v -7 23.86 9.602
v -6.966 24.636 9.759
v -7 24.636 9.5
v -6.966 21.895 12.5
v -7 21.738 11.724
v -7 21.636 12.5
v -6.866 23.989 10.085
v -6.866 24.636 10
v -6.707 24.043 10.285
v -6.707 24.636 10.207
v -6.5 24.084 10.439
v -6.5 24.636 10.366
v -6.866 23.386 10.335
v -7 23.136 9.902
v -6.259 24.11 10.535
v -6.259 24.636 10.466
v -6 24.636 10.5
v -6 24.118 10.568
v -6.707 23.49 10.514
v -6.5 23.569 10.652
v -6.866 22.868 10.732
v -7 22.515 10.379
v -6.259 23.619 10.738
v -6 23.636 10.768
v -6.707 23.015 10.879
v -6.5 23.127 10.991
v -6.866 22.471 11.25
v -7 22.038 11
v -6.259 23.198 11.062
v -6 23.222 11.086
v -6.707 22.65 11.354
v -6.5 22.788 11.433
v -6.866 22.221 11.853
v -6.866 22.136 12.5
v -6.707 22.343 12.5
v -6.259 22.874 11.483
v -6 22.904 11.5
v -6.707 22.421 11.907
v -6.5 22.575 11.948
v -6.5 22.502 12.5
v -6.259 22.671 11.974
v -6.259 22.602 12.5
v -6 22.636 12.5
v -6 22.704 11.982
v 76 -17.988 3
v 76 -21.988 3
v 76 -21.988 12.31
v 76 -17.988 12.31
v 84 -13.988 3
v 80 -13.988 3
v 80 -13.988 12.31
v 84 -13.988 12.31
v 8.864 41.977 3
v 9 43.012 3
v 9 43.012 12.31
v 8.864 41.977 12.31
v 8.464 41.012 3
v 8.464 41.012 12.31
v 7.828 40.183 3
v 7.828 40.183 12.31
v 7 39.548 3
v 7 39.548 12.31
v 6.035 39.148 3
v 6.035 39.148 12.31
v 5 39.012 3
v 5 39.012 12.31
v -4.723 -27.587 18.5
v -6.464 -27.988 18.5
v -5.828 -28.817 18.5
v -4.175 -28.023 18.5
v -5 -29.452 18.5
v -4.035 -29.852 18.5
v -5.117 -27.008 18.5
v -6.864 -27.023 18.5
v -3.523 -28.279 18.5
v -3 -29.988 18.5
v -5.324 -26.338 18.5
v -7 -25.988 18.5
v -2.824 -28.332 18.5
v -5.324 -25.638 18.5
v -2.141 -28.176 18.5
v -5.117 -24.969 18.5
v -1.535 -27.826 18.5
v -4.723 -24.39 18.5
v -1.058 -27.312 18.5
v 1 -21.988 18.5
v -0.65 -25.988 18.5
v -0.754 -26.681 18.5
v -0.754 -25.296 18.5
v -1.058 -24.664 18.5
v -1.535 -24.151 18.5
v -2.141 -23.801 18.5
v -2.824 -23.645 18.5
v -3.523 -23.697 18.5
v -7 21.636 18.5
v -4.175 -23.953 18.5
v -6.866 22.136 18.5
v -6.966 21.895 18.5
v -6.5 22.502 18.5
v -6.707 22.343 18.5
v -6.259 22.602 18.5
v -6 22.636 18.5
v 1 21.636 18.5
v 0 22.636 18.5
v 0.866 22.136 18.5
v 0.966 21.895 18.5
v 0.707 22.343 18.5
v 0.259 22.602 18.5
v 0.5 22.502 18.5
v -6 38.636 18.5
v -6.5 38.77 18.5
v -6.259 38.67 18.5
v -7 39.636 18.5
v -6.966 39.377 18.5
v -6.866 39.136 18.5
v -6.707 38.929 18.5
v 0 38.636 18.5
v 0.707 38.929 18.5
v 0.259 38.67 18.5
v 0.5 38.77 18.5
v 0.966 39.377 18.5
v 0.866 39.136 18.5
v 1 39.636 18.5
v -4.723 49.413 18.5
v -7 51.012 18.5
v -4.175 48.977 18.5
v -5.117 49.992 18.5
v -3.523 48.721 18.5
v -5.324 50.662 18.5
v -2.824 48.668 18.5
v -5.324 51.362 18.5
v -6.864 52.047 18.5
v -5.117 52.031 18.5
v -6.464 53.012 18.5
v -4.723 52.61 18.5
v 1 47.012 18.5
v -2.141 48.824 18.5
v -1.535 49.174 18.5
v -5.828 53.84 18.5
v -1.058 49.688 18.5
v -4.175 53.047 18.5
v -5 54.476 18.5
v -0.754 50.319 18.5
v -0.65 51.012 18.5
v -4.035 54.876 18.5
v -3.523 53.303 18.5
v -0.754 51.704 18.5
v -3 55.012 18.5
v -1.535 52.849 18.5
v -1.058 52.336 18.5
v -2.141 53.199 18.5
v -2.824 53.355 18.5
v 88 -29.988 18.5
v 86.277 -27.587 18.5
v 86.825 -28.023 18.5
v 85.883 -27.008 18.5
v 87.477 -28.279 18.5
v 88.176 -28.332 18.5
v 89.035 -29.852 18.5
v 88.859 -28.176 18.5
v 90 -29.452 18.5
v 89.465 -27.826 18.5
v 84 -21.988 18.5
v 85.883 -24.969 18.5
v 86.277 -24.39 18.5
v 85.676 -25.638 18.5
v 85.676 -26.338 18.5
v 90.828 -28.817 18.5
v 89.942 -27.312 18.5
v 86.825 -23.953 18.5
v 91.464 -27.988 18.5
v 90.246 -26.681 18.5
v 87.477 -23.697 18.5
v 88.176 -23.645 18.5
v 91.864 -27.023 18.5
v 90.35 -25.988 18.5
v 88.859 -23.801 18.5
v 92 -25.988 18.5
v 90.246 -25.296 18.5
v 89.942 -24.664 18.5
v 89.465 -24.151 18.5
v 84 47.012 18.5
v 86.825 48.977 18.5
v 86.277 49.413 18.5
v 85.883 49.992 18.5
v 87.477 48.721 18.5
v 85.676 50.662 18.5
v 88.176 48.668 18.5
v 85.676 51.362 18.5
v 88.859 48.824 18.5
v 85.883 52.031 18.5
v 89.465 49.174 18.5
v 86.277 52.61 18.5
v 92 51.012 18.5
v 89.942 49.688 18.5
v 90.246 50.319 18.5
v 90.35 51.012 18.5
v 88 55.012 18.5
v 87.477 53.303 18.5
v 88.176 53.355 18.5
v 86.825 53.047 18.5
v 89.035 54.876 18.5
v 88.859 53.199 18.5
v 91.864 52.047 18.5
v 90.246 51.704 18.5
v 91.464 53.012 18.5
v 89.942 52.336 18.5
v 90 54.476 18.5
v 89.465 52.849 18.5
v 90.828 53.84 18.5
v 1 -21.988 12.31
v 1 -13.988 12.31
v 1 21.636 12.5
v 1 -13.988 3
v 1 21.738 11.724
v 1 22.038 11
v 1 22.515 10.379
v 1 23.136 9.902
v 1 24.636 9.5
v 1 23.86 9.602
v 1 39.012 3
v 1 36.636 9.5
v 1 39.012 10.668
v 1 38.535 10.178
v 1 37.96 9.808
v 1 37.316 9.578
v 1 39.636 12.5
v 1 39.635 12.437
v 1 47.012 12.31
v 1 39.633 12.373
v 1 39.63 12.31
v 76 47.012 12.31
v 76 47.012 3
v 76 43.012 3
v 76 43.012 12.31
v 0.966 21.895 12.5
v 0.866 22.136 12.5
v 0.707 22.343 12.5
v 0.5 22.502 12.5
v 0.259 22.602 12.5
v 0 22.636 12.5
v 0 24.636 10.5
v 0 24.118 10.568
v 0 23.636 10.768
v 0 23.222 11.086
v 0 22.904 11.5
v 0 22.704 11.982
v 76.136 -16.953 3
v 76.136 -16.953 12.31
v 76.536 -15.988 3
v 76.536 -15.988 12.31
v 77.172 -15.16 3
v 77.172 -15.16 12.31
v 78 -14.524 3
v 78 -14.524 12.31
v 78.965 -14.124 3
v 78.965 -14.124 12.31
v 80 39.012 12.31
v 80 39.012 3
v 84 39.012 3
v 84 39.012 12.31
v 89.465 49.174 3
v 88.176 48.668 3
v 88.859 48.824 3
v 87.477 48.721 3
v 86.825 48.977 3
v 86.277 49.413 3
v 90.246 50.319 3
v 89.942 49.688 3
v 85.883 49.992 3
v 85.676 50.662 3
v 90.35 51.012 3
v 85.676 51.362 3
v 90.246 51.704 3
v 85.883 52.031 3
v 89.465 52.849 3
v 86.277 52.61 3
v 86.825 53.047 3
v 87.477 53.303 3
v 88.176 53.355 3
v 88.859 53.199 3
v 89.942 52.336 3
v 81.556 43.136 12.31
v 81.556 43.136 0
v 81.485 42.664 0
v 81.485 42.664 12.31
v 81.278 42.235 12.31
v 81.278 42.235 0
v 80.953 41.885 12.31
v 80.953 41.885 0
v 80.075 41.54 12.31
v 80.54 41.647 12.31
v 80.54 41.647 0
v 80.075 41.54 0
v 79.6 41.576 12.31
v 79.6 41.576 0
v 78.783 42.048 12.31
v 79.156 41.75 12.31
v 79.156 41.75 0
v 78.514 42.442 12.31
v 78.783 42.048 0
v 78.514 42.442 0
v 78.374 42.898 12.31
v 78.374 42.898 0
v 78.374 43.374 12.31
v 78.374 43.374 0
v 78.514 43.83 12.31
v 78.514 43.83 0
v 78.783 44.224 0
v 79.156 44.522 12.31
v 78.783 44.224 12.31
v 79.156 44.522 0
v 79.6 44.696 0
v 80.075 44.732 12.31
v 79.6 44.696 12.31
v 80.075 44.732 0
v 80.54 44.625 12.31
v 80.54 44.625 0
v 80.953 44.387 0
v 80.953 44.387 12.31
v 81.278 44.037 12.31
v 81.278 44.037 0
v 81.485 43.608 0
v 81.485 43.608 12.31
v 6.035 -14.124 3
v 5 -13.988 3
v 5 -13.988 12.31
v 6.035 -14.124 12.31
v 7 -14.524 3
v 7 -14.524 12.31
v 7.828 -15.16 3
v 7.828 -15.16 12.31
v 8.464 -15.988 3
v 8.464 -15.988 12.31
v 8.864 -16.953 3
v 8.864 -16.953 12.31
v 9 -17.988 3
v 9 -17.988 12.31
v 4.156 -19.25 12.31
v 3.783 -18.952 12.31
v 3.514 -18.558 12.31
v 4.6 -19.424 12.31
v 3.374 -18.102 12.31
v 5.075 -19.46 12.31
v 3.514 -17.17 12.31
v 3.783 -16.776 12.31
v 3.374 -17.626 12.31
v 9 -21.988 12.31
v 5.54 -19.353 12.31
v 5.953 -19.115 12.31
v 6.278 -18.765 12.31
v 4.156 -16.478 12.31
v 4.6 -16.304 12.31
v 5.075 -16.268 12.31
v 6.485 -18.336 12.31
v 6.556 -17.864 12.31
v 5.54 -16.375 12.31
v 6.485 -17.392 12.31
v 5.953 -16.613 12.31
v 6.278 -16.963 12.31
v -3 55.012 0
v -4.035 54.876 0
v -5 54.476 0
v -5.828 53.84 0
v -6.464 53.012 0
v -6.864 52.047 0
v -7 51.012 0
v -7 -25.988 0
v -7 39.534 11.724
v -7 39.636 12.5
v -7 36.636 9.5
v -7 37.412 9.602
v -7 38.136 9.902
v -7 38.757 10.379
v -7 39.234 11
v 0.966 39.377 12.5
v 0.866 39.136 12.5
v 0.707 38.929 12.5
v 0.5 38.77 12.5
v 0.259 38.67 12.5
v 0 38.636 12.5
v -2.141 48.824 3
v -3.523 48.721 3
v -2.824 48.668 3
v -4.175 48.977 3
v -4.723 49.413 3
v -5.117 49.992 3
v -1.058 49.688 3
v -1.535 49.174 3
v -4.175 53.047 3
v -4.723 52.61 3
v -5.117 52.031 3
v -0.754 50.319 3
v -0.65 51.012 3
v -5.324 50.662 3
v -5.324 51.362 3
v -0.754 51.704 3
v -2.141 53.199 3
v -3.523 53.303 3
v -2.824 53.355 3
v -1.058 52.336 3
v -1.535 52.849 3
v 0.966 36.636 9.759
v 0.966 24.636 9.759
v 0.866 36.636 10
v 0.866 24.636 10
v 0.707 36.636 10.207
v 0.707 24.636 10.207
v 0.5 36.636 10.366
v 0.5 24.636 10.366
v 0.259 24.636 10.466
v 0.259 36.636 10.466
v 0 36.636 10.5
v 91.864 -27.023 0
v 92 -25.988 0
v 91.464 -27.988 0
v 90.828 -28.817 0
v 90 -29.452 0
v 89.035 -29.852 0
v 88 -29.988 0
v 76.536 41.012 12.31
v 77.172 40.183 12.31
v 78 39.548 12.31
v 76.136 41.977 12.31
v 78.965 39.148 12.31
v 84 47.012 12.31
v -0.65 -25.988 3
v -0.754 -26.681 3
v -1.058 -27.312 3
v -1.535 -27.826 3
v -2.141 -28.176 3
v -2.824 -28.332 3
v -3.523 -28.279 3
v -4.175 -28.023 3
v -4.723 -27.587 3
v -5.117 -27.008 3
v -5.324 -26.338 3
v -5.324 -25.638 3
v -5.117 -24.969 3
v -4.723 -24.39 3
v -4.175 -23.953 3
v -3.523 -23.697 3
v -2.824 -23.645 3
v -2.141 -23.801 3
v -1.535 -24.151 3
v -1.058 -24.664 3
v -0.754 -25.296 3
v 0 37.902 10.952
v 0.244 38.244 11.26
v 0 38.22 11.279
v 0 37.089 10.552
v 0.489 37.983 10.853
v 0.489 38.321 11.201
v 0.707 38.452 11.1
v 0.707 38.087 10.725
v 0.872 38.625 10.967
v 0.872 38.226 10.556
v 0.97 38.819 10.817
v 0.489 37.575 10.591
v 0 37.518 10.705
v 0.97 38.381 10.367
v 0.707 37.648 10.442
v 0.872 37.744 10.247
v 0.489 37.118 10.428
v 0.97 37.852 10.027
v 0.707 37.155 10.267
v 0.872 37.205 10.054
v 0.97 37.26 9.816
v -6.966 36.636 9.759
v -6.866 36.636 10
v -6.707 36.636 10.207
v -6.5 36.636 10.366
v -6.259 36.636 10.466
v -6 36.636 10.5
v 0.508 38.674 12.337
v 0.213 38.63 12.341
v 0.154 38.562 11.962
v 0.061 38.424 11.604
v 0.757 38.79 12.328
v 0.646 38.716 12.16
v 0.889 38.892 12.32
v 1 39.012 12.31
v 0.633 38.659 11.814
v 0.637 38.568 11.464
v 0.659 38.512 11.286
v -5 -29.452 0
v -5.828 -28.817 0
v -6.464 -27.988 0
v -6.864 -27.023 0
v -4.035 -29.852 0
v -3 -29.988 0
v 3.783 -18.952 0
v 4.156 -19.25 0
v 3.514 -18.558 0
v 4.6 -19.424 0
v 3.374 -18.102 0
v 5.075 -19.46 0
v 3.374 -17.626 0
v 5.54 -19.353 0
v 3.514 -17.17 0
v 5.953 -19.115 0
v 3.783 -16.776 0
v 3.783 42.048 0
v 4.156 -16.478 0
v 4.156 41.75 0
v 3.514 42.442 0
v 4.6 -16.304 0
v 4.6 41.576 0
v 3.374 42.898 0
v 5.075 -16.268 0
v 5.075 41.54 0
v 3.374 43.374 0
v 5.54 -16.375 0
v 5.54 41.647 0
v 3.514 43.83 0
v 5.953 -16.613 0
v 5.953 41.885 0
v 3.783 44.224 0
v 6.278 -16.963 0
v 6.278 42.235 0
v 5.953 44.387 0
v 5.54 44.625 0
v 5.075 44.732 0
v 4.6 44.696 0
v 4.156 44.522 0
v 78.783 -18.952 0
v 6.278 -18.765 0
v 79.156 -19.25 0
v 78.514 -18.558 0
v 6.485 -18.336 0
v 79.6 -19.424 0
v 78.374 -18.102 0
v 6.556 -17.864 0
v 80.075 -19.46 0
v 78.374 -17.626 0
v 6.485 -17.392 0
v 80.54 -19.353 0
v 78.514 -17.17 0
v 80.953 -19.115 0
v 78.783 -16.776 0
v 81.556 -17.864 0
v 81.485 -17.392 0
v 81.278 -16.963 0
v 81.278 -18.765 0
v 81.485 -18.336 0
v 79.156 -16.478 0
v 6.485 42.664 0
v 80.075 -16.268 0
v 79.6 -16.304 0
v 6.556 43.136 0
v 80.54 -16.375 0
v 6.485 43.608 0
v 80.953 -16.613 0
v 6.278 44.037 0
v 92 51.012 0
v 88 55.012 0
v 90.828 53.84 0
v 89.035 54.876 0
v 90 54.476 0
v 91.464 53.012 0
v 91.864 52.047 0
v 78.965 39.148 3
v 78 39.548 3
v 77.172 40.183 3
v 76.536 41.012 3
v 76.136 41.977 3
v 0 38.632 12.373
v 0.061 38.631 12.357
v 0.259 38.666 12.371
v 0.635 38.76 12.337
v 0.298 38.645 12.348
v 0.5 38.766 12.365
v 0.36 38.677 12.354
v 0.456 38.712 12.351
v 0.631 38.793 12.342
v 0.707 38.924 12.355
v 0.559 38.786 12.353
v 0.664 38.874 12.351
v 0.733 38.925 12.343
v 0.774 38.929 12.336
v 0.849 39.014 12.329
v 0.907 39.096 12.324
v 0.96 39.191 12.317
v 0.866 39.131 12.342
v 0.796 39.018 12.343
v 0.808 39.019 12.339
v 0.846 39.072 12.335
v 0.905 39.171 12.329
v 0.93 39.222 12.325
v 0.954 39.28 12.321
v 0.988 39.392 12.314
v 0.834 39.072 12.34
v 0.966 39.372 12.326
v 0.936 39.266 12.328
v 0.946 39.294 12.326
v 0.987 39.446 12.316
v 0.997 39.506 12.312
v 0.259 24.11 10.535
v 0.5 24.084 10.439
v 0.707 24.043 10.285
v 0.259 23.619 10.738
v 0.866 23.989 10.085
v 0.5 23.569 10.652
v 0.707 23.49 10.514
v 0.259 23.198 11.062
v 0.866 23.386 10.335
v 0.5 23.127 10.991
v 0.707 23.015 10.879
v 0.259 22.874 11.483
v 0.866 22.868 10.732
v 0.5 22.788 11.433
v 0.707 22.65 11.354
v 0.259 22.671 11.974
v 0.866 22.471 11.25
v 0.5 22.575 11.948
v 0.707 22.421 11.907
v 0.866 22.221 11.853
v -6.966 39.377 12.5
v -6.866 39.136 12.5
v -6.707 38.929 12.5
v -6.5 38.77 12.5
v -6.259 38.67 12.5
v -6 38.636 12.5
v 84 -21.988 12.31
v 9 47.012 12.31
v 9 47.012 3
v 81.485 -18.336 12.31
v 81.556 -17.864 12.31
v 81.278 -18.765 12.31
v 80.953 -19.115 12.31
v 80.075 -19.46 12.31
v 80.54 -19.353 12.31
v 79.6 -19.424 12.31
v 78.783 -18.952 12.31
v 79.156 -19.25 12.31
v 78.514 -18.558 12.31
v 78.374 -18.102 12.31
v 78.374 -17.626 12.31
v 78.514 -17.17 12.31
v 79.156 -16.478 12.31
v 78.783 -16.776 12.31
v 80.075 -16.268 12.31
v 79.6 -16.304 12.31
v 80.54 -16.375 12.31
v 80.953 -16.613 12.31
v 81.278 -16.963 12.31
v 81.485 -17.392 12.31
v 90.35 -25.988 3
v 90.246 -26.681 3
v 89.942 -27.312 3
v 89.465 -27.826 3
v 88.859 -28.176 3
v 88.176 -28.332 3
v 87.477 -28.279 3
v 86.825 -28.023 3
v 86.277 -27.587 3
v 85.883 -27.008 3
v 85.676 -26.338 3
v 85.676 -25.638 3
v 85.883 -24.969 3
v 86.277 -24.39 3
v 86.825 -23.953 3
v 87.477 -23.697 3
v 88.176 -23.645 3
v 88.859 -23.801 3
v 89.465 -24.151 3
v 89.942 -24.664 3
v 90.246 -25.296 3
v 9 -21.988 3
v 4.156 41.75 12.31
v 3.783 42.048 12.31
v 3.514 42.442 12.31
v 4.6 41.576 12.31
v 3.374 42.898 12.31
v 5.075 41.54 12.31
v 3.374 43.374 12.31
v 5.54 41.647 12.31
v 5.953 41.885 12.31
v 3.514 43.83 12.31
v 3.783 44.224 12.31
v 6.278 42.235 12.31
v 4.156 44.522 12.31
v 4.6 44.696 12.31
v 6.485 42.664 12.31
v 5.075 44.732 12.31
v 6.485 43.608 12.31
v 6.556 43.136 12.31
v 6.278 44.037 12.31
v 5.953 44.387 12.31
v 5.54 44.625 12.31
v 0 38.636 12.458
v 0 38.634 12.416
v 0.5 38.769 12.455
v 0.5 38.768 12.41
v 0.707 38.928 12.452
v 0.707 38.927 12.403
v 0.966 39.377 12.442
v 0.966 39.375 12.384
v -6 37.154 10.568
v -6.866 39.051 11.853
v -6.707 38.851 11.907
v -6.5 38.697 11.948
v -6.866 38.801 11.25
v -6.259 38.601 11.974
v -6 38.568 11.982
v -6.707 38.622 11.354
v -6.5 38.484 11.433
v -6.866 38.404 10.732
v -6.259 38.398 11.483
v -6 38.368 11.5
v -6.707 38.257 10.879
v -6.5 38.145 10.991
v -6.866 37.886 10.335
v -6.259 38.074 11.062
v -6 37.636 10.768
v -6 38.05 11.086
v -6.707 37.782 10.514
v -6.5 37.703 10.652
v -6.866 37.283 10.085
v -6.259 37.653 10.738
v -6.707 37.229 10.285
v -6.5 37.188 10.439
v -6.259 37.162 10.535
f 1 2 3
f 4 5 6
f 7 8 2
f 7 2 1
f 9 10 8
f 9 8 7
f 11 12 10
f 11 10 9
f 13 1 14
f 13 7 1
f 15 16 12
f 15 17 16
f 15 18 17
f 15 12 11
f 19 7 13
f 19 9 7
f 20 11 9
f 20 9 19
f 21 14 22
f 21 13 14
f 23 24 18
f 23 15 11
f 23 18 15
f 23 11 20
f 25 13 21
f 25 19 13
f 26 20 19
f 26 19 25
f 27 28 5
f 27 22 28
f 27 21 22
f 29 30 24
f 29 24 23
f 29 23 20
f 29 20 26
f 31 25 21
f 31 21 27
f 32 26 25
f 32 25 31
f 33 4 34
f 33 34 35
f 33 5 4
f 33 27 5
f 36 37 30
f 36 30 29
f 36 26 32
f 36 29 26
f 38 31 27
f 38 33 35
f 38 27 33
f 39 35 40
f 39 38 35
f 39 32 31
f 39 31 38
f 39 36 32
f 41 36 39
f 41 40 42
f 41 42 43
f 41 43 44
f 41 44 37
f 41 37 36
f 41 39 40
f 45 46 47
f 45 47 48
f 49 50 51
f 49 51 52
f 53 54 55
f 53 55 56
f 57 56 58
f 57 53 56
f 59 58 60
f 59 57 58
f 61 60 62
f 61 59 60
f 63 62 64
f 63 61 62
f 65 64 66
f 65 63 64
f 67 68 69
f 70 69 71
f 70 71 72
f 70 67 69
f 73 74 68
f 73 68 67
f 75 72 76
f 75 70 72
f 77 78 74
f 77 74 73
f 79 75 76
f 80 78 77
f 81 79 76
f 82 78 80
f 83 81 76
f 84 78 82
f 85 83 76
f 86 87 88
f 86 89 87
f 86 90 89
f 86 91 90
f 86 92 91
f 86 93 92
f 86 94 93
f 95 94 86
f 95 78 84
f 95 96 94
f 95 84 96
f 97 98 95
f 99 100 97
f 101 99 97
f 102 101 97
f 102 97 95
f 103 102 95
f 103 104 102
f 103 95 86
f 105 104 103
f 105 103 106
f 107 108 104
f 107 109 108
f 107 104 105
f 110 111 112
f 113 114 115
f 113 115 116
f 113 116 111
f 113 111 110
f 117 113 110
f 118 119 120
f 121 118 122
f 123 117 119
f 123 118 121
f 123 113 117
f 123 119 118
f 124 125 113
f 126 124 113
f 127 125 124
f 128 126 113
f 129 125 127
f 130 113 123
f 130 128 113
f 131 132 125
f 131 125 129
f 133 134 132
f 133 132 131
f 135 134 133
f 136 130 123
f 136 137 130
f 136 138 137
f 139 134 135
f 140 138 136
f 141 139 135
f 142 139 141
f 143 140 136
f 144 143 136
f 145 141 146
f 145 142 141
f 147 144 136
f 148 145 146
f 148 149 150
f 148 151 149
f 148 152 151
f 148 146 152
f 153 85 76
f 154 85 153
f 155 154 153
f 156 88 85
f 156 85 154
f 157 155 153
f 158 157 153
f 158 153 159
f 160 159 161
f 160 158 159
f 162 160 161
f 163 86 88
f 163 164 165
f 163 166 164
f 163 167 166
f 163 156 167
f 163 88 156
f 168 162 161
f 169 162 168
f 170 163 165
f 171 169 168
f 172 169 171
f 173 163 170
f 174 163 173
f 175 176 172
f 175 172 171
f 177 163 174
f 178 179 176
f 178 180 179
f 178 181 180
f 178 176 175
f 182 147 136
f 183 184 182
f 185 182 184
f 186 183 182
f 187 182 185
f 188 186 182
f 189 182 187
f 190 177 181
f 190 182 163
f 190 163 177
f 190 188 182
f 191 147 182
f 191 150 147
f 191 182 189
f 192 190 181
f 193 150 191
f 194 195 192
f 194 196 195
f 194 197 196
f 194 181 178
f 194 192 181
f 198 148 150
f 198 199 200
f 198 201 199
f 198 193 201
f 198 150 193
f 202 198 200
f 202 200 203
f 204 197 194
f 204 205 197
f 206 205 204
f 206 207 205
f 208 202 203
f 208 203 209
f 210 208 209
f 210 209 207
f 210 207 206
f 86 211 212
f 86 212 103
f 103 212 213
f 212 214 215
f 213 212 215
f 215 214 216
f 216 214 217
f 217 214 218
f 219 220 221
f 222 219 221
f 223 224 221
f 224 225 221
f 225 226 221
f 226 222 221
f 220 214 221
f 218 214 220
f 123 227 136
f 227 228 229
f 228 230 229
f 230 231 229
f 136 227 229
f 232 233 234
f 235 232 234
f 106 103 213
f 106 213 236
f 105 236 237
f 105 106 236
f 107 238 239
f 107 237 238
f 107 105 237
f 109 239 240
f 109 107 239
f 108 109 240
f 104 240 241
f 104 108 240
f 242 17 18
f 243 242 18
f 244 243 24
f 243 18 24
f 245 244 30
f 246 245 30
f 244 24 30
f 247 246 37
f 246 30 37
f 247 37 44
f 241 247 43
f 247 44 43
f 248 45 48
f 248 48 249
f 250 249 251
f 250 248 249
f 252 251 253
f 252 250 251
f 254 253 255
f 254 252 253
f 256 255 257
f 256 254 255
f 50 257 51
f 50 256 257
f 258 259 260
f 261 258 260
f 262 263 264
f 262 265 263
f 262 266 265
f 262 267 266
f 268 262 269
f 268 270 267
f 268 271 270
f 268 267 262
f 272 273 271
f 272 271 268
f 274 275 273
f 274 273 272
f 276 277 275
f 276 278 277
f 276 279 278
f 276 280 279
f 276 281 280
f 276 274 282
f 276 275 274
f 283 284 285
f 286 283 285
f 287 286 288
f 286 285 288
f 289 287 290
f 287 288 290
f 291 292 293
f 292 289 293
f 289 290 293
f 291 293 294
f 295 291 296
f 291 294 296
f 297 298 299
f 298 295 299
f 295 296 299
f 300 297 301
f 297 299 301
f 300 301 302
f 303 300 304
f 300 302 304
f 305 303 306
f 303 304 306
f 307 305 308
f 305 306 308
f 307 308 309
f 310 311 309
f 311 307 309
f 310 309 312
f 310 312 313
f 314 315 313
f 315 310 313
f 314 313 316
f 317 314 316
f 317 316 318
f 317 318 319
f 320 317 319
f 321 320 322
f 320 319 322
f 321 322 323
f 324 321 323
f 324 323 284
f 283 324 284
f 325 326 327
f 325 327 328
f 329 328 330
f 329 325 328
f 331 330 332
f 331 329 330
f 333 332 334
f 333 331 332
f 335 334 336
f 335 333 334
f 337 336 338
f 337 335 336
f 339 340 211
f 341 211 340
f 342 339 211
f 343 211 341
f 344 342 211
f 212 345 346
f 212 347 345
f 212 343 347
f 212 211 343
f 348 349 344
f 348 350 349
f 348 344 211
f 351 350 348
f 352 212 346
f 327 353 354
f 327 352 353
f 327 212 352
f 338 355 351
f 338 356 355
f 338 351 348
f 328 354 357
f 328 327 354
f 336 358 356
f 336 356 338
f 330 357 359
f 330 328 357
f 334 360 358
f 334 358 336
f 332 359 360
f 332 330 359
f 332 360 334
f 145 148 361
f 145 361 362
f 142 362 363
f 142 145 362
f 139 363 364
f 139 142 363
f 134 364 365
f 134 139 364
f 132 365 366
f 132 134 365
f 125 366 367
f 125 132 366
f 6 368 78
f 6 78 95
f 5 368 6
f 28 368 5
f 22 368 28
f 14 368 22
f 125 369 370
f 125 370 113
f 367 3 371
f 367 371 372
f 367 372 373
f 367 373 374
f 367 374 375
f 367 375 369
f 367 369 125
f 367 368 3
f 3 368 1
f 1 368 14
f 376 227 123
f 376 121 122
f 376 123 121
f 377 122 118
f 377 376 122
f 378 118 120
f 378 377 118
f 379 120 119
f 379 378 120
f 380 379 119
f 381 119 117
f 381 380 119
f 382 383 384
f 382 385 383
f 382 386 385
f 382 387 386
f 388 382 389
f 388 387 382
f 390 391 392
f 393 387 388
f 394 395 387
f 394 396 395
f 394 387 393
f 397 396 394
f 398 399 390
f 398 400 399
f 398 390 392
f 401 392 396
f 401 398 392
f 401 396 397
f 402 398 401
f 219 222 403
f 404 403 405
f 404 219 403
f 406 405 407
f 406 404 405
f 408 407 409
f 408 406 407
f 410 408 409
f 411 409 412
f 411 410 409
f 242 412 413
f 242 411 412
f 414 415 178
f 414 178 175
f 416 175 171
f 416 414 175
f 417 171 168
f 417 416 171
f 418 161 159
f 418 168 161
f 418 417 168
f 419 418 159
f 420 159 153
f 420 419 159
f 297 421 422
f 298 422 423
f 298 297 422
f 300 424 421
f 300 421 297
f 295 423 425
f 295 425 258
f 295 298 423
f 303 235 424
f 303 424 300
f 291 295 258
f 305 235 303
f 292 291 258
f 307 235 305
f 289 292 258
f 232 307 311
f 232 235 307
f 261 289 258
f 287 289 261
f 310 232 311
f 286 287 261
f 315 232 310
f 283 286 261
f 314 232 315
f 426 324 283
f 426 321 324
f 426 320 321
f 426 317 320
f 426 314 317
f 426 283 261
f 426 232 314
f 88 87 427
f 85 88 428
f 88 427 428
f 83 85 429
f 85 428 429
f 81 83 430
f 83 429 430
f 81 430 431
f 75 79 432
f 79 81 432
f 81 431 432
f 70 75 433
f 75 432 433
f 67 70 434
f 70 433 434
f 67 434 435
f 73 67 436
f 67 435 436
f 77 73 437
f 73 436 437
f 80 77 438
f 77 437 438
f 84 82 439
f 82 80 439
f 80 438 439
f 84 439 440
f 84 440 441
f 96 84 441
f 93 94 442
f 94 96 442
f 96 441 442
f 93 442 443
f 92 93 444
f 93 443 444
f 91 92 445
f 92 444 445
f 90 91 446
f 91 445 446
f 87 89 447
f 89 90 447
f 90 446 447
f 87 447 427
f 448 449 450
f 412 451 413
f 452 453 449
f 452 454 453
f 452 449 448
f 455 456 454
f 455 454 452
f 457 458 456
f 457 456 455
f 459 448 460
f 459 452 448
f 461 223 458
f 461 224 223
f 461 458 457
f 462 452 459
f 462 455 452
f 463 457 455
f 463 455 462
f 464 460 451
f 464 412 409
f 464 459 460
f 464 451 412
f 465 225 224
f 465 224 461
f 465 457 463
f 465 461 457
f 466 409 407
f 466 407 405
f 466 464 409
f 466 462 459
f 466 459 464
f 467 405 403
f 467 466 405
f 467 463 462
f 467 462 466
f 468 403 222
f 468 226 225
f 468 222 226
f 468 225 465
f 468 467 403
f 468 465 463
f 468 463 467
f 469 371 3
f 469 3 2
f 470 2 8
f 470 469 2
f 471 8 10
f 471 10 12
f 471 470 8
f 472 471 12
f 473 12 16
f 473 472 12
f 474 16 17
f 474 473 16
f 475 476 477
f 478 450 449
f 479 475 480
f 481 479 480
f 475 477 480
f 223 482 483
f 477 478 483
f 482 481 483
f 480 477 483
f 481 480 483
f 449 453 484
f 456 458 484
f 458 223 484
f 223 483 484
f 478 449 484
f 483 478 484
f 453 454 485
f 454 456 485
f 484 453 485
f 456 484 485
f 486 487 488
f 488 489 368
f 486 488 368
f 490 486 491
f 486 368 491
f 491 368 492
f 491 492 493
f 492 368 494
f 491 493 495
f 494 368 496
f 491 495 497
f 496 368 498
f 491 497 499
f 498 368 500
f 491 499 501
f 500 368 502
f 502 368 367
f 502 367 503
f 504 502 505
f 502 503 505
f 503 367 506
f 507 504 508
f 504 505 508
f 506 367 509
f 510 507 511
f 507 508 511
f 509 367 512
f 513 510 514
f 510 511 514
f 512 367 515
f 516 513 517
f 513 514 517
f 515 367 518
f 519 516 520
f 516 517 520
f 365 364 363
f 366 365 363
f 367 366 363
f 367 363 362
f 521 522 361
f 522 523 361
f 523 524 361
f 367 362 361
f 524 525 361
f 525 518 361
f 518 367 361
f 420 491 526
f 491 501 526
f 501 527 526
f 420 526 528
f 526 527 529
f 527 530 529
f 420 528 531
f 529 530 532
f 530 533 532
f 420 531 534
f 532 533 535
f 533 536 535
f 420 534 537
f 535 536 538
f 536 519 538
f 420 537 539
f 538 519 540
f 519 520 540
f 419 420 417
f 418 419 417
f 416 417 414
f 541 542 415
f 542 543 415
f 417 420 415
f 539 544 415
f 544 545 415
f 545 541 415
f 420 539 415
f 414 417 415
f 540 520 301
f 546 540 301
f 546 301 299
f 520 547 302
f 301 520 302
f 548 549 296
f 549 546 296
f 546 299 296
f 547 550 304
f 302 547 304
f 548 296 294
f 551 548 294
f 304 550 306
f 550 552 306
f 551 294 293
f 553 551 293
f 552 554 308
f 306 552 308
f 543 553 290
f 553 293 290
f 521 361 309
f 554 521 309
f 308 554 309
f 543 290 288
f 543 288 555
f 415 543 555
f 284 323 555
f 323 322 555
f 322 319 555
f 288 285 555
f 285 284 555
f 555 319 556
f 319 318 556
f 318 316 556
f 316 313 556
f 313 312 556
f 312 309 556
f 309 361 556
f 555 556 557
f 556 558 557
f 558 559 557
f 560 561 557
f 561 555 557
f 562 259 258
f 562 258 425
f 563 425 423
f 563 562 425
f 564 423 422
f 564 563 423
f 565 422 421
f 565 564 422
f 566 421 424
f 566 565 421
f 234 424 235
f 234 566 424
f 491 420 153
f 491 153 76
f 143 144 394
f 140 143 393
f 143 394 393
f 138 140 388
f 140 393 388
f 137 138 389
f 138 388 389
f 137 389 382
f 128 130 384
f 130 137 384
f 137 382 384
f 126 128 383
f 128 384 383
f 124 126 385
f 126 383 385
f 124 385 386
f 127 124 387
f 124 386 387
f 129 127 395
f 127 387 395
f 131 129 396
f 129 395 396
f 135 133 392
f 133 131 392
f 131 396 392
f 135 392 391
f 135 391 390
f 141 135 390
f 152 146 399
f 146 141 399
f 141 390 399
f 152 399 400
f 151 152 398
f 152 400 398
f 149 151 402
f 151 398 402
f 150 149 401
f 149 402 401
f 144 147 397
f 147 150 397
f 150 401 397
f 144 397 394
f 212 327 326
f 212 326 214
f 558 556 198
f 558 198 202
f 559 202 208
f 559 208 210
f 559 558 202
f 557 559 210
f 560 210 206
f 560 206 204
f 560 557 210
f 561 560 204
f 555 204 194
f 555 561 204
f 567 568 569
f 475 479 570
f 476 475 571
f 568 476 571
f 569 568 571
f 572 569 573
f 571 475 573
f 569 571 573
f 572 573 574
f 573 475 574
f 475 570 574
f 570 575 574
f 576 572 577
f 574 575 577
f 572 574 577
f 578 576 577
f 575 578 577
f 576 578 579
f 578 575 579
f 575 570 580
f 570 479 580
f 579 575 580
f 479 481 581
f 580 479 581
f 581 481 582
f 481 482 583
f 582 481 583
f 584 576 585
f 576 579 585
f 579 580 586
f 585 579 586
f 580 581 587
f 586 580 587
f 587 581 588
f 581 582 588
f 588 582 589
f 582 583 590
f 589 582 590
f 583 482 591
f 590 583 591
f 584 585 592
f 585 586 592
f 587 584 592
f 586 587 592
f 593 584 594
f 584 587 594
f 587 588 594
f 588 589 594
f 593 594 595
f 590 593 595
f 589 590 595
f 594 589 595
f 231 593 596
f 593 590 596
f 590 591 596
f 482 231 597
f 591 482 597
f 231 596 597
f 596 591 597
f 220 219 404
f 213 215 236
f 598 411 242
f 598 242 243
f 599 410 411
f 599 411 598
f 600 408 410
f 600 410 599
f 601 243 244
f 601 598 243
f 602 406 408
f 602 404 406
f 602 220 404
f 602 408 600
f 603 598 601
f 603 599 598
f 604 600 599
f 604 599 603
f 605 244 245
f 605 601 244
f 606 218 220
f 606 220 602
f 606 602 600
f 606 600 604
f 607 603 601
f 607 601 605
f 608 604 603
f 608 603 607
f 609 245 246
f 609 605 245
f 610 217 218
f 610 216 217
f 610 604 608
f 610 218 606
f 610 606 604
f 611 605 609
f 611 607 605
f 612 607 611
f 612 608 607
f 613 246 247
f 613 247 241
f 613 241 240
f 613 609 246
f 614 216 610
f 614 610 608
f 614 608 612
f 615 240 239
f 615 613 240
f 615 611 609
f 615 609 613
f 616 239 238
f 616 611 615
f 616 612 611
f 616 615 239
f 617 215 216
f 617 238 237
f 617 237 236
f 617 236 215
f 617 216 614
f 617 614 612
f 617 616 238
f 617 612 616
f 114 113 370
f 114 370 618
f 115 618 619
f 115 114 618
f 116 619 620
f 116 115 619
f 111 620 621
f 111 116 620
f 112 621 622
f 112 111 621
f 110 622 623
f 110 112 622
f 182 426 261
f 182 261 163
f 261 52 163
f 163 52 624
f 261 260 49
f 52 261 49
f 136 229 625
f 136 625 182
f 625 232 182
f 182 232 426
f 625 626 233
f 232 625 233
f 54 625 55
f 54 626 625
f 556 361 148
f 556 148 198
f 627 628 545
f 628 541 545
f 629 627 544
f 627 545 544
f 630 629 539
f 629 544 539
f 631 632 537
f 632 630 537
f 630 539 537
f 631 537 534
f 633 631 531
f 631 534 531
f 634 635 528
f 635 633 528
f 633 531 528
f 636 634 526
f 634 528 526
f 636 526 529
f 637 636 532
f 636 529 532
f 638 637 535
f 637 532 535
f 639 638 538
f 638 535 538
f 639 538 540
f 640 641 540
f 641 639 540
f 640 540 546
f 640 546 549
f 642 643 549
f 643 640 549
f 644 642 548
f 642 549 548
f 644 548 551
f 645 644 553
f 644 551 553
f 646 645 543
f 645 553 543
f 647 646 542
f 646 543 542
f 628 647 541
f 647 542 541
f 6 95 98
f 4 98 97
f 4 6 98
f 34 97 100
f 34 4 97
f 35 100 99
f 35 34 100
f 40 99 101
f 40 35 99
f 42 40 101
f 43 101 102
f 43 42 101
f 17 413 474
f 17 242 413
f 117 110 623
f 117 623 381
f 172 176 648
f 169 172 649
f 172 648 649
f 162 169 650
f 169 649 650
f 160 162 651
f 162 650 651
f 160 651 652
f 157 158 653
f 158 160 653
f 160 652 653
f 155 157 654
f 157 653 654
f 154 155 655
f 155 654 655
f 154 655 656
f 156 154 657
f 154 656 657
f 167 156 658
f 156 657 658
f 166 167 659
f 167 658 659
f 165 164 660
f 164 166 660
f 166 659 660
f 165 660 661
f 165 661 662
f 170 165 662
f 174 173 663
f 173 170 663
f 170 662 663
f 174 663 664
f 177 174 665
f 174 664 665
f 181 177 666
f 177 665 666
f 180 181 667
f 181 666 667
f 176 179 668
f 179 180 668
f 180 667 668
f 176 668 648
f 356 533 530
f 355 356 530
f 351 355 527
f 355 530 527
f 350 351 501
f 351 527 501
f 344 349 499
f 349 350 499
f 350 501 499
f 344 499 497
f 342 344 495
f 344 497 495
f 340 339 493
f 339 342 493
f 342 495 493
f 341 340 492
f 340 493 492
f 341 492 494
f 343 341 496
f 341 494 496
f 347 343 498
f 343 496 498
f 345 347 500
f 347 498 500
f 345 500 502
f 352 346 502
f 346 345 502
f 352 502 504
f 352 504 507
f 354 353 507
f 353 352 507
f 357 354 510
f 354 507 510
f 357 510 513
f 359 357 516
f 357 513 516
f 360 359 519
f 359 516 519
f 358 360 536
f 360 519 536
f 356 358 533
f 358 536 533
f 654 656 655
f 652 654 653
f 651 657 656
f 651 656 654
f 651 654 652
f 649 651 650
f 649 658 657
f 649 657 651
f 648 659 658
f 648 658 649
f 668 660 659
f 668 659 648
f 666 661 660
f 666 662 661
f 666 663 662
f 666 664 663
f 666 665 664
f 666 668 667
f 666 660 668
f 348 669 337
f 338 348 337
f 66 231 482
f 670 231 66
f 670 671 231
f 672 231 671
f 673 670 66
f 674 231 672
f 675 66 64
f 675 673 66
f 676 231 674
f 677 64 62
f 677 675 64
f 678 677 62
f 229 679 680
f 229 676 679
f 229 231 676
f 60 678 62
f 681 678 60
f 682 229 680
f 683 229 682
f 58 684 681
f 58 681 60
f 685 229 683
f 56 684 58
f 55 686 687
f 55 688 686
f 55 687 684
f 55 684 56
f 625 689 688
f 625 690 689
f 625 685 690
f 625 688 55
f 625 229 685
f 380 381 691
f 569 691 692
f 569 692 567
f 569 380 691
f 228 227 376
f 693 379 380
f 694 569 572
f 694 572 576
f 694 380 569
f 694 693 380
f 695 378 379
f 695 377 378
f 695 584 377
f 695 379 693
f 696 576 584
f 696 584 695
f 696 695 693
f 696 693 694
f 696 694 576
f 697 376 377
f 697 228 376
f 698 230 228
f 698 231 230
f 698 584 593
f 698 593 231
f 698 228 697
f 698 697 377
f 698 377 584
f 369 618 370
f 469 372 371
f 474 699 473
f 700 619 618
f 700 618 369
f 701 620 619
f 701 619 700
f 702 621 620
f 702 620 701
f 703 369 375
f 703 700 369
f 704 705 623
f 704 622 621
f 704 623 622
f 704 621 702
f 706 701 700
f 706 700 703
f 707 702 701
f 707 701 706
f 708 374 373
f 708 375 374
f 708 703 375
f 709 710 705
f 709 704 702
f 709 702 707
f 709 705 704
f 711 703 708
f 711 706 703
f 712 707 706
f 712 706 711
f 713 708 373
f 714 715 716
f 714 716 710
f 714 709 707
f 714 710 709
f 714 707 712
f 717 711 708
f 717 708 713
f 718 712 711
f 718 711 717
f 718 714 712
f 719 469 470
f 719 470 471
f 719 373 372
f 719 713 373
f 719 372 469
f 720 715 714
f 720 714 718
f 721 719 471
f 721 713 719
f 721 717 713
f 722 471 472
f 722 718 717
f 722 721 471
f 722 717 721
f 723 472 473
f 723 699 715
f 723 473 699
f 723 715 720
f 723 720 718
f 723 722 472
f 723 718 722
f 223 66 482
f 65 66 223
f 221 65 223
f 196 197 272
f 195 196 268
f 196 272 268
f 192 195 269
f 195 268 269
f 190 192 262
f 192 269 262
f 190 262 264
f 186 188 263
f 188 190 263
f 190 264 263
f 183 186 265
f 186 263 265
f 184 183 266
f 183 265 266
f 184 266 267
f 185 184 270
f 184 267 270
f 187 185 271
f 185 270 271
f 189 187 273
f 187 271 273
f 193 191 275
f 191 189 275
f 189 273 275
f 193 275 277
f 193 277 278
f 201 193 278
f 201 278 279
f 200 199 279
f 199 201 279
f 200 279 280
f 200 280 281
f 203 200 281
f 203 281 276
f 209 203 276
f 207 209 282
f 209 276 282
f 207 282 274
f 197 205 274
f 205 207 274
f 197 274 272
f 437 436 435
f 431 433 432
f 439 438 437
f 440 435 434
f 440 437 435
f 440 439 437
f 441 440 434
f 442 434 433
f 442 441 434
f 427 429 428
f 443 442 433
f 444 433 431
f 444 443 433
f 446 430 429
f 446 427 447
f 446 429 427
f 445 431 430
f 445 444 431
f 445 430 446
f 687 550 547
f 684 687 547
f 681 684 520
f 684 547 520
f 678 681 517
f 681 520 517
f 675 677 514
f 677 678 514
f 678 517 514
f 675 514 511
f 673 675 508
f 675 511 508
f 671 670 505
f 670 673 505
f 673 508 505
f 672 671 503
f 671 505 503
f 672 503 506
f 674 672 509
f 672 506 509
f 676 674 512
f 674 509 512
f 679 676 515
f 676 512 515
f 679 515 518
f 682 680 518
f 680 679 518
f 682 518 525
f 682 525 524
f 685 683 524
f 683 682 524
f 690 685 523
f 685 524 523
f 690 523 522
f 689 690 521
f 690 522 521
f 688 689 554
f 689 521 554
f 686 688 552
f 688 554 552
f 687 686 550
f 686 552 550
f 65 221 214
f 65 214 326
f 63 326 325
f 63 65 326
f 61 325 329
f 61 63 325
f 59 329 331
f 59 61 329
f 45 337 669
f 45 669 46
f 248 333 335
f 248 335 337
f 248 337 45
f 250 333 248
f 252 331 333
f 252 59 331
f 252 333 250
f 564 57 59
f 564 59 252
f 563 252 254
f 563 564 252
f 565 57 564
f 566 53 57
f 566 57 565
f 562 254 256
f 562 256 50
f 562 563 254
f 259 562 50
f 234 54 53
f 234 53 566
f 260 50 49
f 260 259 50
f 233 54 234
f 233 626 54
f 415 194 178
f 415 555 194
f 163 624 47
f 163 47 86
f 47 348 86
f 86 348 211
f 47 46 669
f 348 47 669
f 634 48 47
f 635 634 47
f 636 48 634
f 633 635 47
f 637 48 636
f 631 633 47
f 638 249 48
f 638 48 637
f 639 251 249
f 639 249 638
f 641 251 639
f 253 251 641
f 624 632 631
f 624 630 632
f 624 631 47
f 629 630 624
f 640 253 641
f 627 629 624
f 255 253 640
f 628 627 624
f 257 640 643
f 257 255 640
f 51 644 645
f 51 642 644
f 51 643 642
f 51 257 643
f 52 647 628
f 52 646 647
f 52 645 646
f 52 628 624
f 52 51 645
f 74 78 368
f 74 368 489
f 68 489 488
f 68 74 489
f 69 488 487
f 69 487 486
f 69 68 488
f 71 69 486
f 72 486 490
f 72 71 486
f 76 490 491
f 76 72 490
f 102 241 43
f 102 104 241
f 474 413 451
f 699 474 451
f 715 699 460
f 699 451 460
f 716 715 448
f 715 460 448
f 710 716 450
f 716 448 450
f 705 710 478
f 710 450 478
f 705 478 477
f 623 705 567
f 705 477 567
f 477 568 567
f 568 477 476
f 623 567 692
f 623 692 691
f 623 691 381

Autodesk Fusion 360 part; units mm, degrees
sketch "Sketch1" plane through (0, 0, 0) normal (0, 0, 1) x (1, 0, 0) in component "Hackpad Case"
  line L0 (1, 47.0118) -> (84, 47.0118)
  line L1 (84, 47.0118) -> (84, -21.9882)
  line L2 (84, -21.9882) -> (1, -21.9882)
  line L3 (1, -21.9882) -> (1, 47.0118)
  line L4 (-7, 55.0118) -> (92, 55.0118)
  line L5 (92, 55.0118) -> (92, -29.9882)
  line L6 (92, -29.9882) -> (-7, -29.9882)
  line L7 (-7, -29.9882) -> (-7, 55.0118)
  circle A0 centre (-3, 51.0118) radius 2.35
  circle A1 centre (88, 51.0118) radius 2.35
  circle A2 centre (-3, -25.9882) radius 2.35
  circle A3 centre (88, -25.9882) radius 2.35
  circle A4 centre (4.9559, 43.136) radius 1.6
  line L8 (1, 47.0118) -> (9, 47.0118)
  line L9 (9, 47.0118) -> (9, 43.0118)
  line L10 (5, 39.0118) -> (1, 39.0118)
  line L11 (1, 39.0118) -> (1, 47.0118)
  circle A5 centre (79.9559, 43.136) radius 1.6
  line L12 (84, 47.0118) -> (76, 47.0118)
  line L13 (76, 47.0118) -> (76, 43.0118)
  line L14 (80, 39.0118) -> (84, 39.0118)
  line L15 (84, 39.0118) -> (84, 47.0118)
  circle A6 centre (4.9559, -17.864) radius 1.6
  line L16 (1, -21.9882) -> (9, -21.9882)
  line L17 (9, -21.9882) -> (9, -17.9882)
  line L18 (5, -13.9882) -> (1, -13.9882)
  line L19 (1, -13.9882) -> (1, -21.9882)
  line L20 (84, -21.9882) -> (76, -21.9882)
  line L21 (76, -21.9882) -> (76, -17.9882)
  line L22 (80, -13.9882) -> (84, -13.9882)
  line L23 (84, -13.9882) -> (84, -21.9882)
  circle A7 centre (79.9559, -17.864) radius 1.6
  arc A8 (5, 39.0118) -> (9, 43.0118) centre (5, 43.0118) ccw
  arc A9 (76, 43.0118) -> (80, 39.0118) centre (80, 43.0118) ccw
  arc A10 (80, -13.9882) -> (76, -17.9882) centre (80, -17.9882) ccw
  arc A11 (9, -17.9882) -> (5, -13.9882) centre (5, -17.9882) ccw
  point P0 (9, 39.0118)
  point P1 (76, 39.0118)
  point P2 (9, -13.9882)
  point P3 (76, -13.9882)
  dimension "d1" = 83
  dimension "d2" = 69
  dimension "d3" = 8
  dimension "d4" = 8
  dimension "d5" = 8
  dimension "d6" = 8
  dimension "d7" = 4.7
  dimension "d8" = 4
  dimension "d9" = 4
  dimension "d10" = 4.7
  dimension "d11" = 4
  dimension "d12" = 4
  dimension "d13" = 4.7
  dimension "d14" = 4
  dimension "d15" = 4
  dimension "d16" = 4.7
  dimension "d17" = 4
  dimension "d18" = 4
  dimension "d22" = 3.2
  dimension "d25" = 8
  dimension "d26" = 8
  dimension "d27" = 3.2
  dimension "d28" = 8
  dimension "d29" = 8
  dimension "d32" = 3.2
  dimension "d33" = 8
  dimension "d34" = 8
  dimension "d37" = 8
  dimension "d38" = 8
  dimension "d39" = 3.2
  dimension "d62" = 61
  dimension "d63" = 75
  dimension "d64" = 75
  dimension "d65" = 61
  dimension "d66" = 4
  dimension "d67" = 4
  dimension "d68" = 4
  dimension "d69" = 4
extrude "Extrude1" add sketch "Sketch1" along normal blind 3 contours L0 L3 L8 L9 L10 L11 A8 | L0 L1 L2 L3 L9 L10 L13 L14 L17 L18 L21 L22 A8 A9 A10 A11 | L0 L1 L12 L13 L14 L15 A9 | L2 L3 L16 L17 L18 L19 A11 | L1 L2 L20 L21 L22 L23 A10 | L4 L5 L6 L7 | A0 | A1 | A2 | A3
extrude "Extrude2" add sketch "Sketch1" along normal blind 18.5 contours L4 L5 L6 L7
extrude "Extrude3" add sketch "Sketch1" along normal blind 12.31 contours L0 L3 L8 L9 L10 L11 A8 | L0 L1 L12 L13 L14 L15 A9 | L2 L3 L16 L17 L18 L19 A11 | L1 L2 L20 L21 L22 L23 A10
sketch "Sketch3" plane through (0, 0, 18.5) normal (0, 0, 1) x (-1, 0, 0)
  line L0 (-84, -47.0118) -> (-84, 21.9882)
  line L1 (-84, 21.9882) -> (-1, 21.9882)
  line L2 (-1, 21.9882) -> (-1, -47.0118)
  line L3 (-1, -47.0118) -> (-84, -47.0118)
  circle A0 centre (3, 25.9882) radius 2.35
  circle A1 centre (-88, 25.9882) radius 2.35
  circle A2 centre (-88, -51.0118) radius 2.35
  circle A3 centre (3, -51.0118) radius 2.35
  line L4 (7, 29.9882) -> (-92, 29.9882)
  line L5 (-92, 29.9882) -> (-92, -55.0118)
  line L6 (-92, -55.0118) -> (7, -55.0118)
  line L7 (7, -55.0118) -> (7, 29.9882)
  line L8 (7, -38.636) -> (-1, -38.636)
  line L9 (-1, -38.636) -> (-1, -22.636)
  line L10 (-1, -22.636) -> (7, -22.636)
  line L11 (7, -22.636) -> (7, -38.636)
  circle A4 centre (-4.9559, -43.136) radius 1.6
  circle A5 centre (-4.9559, 17.864) radius 1.6
  dimension "d78" = 4.5
  dimension "d79" = 40.5
extrude "Extrude4" cut sketch "Sketch3" against normal blind 8 contours L2 L7 L8 L9 L10 L11
fillet "Fillet2" radius 4 4 edges at (-7, -29.9882, 9.25) (92, -29.9882, 9.25) (92, 55.0118, 9.25) (-7, 55.0118, 9.25)
fillet "Fillet3" radius 2 2 edges at (-3, 22.636, 10.5) (-3, 38.636, 10.5)
fillet "Fillet4" radius 1 10 edges at (-7, 22.636, 15.5) (-7, 23.2217, 11.0858) (-7, 30.636, 10.5) (-7, 38.0502, 11.0858) (-7, 38.636, 15.5) (1, 38.636, 15.5) (1, 38.0502, 11.0858) (1, 30.636, 10.5) (1, 23.2217, 11.0858) (1, 22.636, 15.5)
component "Hackpad Case" placed x (1, 0, 0) y (0, 1, 0) z (0, 0, 1) at (0, 0, 0)
